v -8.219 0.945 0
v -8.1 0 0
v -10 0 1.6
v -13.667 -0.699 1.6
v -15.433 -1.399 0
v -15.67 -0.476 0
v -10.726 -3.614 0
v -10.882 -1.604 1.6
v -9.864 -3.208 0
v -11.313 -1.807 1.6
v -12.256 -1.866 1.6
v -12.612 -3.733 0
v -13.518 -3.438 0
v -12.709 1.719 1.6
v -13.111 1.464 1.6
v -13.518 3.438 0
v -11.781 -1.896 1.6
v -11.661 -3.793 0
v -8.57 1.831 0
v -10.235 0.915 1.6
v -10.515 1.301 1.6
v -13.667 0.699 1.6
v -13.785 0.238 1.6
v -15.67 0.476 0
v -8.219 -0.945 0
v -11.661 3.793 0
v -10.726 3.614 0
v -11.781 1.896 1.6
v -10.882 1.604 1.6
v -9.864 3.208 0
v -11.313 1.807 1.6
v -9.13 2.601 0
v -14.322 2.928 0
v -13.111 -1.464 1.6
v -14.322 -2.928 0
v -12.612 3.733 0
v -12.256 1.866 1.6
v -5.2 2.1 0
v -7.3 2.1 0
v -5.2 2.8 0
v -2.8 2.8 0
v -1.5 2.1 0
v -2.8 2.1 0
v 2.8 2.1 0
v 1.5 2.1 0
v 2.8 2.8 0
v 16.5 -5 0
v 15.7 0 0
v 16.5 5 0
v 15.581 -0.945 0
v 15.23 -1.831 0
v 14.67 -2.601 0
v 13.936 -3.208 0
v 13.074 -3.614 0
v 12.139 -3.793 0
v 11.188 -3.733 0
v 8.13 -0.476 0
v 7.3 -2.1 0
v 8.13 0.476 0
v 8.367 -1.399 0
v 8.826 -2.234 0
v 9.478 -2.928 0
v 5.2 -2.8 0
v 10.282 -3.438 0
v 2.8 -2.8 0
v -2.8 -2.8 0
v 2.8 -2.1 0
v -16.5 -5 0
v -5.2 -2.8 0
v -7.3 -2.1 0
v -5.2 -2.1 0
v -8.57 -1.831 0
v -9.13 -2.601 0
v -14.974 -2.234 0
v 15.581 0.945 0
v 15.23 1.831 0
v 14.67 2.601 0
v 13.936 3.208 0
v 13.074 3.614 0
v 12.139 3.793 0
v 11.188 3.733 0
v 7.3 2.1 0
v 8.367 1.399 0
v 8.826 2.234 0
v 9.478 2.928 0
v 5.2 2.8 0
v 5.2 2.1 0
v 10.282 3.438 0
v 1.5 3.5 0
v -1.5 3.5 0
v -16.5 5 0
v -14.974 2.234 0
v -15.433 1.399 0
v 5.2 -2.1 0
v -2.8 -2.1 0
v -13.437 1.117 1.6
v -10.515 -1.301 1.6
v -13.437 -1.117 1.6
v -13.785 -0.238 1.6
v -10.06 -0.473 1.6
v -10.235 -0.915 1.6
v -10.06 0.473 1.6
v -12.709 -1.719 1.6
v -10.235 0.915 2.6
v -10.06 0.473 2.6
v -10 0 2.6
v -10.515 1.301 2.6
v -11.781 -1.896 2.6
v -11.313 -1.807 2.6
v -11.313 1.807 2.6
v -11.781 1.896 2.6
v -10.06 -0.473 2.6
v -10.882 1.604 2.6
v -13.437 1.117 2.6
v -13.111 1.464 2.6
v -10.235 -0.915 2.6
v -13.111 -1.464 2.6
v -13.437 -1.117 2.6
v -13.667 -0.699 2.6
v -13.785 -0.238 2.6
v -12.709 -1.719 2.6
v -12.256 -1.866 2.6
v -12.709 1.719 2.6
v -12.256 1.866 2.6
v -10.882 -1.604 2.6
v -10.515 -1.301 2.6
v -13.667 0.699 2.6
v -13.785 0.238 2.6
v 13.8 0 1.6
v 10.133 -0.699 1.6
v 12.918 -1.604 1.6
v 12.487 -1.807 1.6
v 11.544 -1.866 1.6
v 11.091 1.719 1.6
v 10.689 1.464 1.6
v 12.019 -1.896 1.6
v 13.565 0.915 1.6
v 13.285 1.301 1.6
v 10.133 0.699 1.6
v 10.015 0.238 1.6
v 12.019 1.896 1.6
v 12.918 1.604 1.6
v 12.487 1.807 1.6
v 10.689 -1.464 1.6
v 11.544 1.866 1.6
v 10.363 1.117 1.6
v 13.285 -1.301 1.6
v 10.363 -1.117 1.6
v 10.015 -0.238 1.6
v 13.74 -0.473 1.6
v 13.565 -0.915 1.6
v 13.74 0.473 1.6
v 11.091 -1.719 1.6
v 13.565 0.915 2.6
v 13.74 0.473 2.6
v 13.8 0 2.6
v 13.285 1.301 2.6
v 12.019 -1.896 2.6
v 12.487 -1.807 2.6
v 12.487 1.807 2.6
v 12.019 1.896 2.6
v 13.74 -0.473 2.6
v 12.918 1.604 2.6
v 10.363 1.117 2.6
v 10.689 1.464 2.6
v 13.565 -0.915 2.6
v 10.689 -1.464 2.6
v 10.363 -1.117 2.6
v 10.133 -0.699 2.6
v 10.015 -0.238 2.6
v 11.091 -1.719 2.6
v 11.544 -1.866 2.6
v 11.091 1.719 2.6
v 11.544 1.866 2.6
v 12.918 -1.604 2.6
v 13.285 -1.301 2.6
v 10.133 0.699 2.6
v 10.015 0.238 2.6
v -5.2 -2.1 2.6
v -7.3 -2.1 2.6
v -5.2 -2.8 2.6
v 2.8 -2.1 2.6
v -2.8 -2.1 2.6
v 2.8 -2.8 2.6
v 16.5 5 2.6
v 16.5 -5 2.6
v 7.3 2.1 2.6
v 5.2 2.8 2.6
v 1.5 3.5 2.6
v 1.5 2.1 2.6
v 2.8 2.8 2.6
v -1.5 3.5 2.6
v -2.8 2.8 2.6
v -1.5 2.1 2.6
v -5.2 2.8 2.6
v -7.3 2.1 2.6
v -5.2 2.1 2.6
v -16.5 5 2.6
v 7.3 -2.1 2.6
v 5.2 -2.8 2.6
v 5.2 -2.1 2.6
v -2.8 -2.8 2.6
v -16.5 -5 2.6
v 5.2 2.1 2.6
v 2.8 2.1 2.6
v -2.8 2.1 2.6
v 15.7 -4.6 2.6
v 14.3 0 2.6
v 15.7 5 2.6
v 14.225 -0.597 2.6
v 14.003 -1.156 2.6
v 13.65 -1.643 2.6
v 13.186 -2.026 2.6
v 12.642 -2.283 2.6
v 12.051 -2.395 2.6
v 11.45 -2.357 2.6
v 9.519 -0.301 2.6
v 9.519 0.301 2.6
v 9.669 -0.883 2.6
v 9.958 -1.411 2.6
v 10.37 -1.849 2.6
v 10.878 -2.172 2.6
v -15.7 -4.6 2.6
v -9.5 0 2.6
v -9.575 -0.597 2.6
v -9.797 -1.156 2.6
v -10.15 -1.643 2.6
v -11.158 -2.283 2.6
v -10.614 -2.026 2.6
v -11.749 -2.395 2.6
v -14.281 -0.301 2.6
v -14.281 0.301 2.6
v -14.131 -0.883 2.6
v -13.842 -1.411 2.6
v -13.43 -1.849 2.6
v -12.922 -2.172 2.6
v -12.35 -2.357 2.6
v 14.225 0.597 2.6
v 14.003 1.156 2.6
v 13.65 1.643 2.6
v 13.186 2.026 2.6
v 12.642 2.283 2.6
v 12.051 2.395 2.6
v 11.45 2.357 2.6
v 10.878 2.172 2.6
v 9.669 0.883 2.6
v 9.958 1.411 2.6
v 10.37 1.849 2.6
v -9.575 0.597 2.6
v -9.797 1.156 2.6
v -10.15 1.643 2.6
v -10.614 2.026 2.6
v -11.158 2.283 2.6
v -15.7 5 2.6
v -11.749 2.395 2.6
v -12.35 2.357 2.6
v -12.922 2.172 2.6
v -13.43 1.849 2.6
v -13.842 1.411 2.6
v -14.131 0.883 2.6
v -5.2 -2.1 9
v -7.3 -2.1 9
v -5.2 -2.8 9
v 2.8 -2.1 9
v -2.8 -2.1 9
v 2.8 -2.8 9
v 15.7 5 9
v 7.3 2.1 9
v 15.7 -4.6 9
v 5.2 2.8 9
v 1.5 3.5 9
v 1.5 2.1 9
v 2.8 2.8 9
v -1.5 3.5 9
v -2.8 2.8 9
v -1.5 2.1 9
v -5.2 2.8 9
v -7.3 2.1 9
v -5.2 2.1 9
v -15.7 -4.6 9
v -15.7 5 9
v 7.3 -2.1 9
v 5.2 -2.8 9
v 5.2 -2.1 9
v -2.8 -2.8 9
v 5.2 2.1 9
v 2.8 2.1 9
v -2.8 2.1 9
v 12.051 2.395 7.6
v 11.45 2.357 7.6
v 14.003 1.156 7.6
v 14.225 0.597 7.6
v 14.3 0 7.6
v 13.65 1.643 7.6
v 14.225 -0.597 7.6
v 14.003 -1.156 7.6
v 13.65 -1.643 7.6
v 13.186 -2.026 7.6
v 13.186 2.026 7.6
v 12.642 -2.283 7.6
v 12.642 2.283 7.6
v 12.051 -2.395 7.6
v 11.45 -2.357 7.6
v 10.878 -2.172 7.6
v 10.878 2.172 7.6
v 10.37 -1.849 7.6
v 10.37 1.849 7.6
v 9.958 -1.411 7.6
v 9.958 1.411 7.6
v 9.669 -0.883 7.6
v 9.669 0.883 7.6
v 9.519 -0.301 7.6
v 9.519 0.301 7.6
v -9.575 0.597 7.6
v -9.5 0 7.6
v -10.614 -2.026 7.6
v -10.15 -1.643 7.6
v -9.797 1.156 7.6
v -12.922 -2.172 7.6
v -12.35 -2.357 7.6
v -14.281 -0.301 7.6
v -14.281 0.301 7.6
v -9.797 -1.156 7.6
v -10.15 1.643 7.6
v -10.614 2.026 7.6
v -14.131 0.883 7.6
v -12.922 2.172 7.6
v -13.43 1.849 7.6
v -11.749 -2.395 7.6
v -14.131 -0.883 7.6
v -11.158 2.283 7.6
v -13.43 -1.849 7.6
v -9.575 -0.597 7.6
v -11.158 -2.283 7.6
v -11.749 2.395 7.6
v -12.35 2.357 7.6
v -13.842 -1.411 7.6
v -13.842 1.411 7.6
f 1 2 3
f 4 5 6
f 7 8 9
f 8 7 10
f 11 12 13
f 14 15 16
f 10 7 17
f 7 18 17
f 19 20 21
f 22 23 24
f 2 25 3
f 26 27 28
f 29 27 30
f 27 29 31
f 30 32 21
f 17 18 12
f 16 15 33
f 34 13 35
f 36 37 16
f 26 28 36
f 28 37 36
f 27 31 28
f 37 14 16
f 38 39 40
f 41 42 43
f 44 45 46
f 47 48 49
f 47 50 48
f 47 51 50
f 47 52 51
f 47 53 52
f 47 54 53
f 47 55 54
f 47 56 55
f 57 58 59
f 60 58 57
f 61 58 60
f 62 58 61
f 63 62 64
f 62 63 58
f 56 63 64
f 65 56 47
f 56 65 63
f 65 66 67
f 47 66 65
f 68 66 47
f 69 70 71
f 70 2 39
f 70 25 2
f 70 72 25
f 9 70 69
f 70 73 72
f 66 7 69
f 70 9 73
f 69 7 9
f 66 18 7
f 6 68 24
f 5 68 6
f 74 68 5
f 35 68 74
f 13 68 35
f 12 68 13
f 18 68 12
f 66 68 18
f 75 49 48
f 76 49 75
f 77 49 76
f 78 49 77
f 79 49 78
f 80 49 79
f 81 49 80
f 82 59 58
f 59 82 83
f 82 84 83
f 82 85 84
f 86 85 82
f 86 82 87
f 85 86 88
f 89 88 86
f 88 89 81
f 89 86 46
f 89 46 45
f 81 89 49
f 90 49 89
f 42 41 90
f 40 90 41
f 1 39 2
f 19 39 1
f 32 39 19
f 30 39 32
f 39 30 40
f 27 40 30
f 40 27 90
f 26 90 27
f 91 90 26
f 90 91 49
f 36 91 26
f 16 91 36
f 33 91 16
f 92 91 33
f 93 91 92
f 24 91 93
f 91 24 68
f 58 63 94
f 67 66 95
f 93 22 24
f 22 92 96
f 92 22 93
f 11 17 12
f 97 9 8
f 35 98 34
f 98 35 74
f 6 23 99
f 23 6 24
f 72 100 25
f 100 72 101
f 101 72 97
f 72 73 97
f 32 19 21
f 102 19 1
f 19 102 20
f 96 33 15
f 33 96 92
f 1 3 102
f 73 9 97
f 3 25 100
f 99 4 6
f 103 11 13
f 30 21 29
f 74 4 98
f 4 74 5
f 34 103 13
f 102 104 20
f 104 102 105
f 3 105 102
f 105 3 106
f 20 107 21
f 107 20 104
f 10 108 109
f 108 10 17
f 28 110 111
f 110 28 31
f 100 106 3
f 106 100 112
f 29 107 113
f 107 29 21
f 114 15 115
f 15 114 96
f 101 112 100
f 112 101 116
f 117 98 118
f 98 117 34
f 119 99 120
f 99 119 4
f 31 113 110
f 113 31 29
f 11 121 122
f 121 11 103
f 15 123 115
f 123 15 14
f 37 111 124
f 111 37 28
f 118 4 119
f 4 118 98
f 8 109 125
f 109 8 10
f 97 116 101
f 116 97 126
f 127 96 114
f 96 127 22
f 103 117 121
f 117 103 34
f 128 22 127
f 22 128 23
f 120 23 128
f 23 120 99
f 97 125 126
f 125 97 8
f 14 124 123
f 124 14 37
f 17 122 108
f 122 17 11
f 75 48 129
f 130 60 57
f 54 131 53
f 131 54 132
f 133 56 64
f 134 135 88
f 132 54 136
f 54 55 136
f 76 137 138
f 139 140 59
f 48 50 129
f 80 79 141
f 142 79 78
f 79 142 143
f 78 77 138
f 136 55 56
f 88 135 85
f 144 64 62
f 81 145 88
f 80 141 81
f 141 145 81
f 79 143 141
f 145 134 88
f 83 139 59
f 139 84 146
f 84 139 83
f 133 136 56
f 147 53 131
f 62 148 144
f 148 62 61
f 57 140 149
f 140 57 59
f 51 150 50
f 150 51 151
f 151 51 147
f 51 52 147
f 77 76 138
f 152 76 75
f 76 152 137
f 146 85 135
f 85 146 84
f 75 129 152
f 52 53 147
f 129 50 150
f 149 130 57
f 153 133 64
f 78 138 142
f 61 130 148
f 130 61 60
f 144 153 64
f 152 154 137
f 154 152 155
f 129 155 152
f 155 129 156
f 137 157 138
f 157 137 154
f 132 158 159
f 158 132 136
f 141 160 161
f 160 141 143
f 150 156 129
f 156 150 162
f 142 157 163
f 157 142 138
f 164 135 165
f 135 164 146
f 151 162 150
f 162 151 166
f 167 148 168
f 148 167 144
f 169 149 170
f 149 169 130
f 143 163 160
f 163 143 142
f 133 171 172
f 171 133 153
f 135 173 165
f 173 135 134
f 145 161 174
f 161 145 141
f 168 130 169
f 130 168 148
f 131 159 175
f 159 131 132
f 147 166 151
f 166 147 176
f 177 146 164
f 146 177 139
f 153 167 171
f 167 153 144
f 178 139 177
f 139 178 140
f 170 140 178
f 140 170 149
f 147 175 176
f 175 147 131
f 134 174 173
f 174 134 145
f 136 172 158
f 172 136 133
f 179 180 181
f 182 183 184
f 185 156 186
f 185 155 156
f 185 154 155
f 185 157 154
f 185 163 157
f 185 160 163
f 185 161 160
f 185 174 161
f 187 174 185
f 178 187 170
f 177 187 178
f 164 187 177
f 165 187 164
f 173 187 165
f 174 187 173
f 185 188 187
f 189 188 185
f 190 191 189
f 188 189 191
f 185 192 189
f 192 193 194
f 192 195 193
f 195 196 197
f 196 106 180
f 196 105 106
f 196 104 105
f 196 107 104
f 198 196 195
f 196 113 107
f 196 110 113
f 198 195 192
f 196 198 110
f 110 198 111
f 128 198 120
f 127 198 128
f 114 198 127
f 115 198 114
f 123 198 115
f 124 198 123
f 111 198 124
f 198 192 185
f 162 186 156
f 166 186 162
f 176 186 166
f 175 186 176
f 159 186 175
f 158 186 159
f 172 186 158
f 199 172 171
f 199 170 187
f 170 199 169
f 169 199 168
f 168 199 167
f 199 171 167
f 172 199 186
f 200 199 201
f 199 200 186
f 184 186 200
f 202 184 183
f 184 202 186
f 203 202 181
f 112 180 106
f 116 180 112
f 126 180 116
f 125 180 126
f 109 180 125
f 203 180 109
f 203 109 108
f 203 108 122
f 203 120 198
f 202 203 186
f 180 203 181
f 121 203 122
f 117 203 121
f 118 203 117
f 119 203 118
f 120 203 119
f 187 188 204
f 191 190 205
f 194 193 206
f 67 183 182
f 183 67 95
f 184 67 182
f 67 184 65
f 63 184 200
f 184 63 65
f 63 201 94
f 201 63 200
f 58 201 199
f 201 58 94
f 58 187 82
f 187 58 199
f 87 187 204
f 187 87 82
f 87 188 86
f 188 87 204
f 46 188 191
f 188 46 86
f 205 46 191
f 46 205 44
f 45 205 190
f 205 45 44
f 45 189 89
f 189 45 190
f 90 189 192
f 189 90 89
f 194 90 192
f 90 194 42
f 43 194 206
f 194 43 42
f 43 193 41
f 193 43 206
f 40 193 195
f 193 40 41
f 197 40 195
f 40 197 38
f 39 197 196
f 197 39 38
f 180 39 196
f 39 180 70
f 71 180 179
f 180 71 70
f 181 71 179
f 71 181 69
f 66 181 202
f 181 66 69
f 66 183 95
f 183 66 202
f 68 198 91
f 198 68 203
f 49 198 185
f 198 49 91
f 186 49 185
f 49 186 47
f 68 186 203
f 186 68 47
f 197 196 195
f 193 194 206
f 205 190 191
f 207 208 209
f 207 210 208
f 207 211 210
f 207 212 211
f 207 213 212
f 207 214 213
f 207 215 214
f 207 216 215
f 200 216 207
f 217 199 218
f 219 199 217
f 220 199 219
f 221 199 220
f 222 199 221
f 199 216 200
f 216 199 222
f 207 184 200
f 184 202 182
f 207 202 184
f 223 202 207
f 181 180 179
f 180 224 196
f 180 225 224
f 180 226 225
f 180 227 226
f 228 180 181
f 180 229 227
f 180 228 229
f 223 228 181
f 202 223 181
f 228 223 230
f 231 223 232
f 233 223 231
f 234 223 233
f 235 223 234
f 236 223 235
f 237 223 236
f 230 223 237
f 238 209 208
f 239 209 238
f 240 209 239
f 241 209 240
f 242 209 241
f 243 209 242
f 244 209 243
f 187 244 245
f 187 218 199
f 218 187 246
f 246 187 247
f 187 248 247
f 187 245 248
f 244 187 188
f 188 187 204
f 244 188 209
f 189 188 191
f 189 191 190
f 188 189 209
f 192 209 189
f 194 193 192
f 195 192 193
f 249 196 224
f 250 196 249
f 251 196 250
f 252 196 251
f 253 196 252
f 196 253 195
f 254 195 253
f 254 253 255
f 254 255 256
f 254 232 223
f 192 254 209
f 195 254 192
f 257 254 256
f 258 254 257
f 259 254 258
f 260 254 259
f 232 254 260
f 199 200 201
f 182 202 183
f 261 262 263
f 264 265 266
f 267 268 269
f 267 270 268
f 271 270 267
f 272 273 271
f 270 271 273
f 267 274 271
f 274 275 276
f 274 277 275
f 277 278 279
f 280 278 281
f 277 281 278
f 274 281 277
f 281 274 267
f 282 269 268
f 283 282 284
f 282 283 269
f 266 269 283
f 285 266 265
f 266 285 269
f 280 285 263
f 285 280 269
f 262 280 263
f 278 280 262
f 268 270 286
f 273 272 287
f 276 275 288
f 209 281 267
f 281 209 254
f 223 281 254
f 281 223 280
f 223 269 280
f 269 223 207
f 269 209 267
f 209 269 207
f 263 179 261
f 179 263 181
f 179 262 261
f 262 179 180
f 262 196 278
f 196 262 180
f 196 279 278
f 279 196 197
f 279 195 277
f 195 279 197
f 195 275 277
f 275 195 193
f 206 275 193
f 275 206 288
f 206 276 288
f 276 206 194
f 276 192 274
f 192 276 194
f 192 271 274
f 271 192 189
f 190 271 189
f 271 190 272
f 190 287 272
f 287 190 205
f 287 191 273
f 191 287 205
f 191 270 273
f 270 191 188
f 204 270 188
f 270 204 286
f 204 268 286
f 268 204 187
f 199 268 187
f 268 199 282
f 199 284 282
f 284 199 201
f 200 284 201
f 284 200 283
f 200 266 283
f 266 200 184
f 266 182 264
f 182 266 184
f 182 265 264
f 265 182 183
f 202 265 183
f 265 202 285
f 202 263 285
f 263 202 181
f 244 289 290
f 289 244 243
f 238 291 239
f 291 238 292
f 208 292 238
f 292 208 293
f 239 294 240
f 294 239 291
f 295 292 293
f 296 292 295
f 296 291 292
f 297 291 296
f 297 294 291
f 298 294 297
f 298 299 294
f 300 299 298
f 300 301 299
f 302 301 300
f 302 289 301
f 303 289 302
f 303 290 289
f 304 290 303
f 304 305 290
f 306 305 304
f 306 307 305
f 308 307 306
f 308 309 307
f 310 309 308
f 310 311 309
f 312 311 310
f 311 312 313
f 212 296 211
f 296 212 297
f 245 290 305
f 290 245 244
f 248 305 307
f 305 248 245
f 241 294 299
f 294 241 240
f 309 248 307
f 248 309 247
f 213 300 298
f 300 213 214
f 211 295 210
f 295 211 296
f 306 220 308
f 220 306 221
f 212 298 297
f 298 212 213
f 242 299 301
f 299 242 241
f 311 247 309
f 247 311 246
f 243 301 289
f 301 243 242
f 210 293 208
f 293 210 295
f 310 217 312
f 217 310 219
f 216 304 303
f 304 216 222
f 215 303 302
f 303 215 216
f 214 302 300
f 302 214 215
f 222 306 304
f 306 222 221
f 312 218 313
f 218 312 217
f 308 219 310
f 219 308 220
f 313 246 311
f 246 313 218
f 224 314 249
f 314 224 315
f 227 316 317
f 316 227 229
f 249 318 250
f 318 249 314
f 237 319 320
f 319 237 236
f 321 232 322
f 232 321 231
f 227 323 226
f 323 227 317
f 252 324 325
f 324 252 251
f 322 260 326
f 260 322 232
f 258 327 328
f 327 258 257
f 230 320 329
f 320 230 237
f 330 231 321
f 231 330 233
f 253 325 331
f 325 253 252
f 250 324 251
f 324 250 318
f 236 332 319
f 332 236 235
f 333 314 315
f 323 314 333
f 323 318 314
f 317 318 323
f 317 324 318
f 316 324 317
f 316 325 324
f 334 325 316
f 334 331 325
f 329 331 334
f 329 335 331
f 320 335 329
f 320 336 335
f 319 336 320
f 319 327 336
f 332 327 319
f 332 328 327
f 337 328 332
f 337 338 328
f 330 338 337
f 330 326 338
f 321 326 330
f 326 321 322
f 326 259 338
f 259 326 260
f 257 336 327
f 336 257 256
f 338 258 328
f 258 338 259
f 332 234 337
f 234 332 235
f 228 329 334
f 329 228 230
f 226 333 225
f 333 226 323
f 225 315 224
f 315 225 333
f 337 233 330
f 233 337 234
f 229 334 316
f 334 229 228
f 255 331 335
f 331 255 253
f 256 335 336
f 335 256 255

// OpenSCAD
// file: ../m3/m3.scad
module m3x5x4_ThreadedInsert() {
    cylinder(h=5,d=4.8,$fn=25);
}

module m3FHCS_counterSink() {
    cylinder(h=1.6, d1=3.8*2, d2=3.8, $fn=25);
}

module m3FHCS_counterSinkCutout(height=5) {
    union() {
        cylinder(h=1.6, d1=3.8*2, d2=3.8, $fn=25);
        cylinder(h=height+1.6, d=3.8, $fn=25);
    }
}

module m3BHCS_counterSinkCutout(height=5, countsinkHeight=1.6) {
    union() {
        cylinder(countsinkHeight, d=6, $fn=25);
        cylinder(h=height, d=3.8, $fn=25);
    }
}

module m3_mountingHole() {
    hull() {
        translate([-1.5,0])
            circle(d=3.8, $fn=25);
        translate([1.5,0]) 
            circle(d=3.8, $fn=25);
    }
}

module m3_mountingHoleColumn(holeInset, holeCountPerColumn, holeSpacing) {
    union () {
        translate([0,holeInset,0]) {
            for (i = [0:1:holeCountPerColumn-1]) {
                translate([0,i*holeSpacing]) 
                    m3_mountingHole();
            }
        }
    }
}
// file: molex3pin.scad
include <../m3/m3.scad>

module molex3pin_portCutoutOutline(center=true) { 
    let(connX=14.6, connY=4.2, latchX=3, latchY=1.4) {
        translate([center ? -connX/2 : 0, center ? -connY/2 : 0])
        polygon([
            [0,0],
            [connX,0],
            [connX,connY],
            [connX/2+latchX/2,connY],
            [connX/2+latchX/2,connY+latchY],
            [connX/2-latchX/2,connY+latchY],
            [connX/2-latchX/2,connY],
            [0,connY]
        ]);
    }
}

module molex3pin_housingCutoutOutline(center=true) {
    let(housingX=10.4, housingY=5.6, pinX=2.4, pinY=1) {
        translate([center ? -housingX/2 : 0, center ? -housingY/2 : 0])
            polygon([
                [0,0],
                [pinX,0],
                [pinX,pinY],
                [housingX-pinX,pinY],
                [housingX-pinX,0],
                [housingX,0],
                [housingX,housingY],
                [housingX-pinX,housingY],
                [housingX-pinX,housingY-pinY],
                [pinX,housingY-pinY],            
                [pinX,housingY],
                [0,housingY]
            ]);
    }
}

module molex3pin_housingOutline() {
    union() {
        molex3pin_portCutoutOutline(true);
        molex3pin_housingCutoutOutline(true);
    }
}

module molex3pin_housing() {
    difference() {
        linear_extrude(9-2.6)
            difference() {
                translate([0,0.2])
                    square([19+4.8*2+2.8,9.6], center=true);
                molex3pin_housingOutline();
            }
        
        translate([19/2+4.8/2,0,0])
            m3x5x4_ThreadedInsert();
            
        translate([-19/2-4.8/2,0,0])
            m3x5x4_ThreadedInsert();
    }
}

module molex3pin_portPanelCutout() {
    union() {
        linear_extrude(2.6)
            molex3pin_housingOutline();
        
        translate([-19/2-4.8/2,0,0])
            m3FHCS_counterSinkCutout();

        translate([19/2+4.8/2,0,0])
            m3FHCS_counterSinkCutout();  
    }
}

module molex3pin_portPanel() {
    difference() {
        linear_extrude(2.6)
            square([33,10], center=true);
        
        molex3pin_portPanelCutout();
    }
}

module molex3pin_preview() {
    molex3pin_portPanel();
    
    translate([0,0,2.6]) molex3pin_housing();
}
// main file
include <molex3pin.scad>

Select = 0; // [0:Preview, 1:portPanel, 2:housing]

if (Select==0) {
    molex3pin_preview();
} else if (Select==1) {
    molex3pin_portPanel();
} else if (Select==2) {
    molex3pin_housing();
} 
